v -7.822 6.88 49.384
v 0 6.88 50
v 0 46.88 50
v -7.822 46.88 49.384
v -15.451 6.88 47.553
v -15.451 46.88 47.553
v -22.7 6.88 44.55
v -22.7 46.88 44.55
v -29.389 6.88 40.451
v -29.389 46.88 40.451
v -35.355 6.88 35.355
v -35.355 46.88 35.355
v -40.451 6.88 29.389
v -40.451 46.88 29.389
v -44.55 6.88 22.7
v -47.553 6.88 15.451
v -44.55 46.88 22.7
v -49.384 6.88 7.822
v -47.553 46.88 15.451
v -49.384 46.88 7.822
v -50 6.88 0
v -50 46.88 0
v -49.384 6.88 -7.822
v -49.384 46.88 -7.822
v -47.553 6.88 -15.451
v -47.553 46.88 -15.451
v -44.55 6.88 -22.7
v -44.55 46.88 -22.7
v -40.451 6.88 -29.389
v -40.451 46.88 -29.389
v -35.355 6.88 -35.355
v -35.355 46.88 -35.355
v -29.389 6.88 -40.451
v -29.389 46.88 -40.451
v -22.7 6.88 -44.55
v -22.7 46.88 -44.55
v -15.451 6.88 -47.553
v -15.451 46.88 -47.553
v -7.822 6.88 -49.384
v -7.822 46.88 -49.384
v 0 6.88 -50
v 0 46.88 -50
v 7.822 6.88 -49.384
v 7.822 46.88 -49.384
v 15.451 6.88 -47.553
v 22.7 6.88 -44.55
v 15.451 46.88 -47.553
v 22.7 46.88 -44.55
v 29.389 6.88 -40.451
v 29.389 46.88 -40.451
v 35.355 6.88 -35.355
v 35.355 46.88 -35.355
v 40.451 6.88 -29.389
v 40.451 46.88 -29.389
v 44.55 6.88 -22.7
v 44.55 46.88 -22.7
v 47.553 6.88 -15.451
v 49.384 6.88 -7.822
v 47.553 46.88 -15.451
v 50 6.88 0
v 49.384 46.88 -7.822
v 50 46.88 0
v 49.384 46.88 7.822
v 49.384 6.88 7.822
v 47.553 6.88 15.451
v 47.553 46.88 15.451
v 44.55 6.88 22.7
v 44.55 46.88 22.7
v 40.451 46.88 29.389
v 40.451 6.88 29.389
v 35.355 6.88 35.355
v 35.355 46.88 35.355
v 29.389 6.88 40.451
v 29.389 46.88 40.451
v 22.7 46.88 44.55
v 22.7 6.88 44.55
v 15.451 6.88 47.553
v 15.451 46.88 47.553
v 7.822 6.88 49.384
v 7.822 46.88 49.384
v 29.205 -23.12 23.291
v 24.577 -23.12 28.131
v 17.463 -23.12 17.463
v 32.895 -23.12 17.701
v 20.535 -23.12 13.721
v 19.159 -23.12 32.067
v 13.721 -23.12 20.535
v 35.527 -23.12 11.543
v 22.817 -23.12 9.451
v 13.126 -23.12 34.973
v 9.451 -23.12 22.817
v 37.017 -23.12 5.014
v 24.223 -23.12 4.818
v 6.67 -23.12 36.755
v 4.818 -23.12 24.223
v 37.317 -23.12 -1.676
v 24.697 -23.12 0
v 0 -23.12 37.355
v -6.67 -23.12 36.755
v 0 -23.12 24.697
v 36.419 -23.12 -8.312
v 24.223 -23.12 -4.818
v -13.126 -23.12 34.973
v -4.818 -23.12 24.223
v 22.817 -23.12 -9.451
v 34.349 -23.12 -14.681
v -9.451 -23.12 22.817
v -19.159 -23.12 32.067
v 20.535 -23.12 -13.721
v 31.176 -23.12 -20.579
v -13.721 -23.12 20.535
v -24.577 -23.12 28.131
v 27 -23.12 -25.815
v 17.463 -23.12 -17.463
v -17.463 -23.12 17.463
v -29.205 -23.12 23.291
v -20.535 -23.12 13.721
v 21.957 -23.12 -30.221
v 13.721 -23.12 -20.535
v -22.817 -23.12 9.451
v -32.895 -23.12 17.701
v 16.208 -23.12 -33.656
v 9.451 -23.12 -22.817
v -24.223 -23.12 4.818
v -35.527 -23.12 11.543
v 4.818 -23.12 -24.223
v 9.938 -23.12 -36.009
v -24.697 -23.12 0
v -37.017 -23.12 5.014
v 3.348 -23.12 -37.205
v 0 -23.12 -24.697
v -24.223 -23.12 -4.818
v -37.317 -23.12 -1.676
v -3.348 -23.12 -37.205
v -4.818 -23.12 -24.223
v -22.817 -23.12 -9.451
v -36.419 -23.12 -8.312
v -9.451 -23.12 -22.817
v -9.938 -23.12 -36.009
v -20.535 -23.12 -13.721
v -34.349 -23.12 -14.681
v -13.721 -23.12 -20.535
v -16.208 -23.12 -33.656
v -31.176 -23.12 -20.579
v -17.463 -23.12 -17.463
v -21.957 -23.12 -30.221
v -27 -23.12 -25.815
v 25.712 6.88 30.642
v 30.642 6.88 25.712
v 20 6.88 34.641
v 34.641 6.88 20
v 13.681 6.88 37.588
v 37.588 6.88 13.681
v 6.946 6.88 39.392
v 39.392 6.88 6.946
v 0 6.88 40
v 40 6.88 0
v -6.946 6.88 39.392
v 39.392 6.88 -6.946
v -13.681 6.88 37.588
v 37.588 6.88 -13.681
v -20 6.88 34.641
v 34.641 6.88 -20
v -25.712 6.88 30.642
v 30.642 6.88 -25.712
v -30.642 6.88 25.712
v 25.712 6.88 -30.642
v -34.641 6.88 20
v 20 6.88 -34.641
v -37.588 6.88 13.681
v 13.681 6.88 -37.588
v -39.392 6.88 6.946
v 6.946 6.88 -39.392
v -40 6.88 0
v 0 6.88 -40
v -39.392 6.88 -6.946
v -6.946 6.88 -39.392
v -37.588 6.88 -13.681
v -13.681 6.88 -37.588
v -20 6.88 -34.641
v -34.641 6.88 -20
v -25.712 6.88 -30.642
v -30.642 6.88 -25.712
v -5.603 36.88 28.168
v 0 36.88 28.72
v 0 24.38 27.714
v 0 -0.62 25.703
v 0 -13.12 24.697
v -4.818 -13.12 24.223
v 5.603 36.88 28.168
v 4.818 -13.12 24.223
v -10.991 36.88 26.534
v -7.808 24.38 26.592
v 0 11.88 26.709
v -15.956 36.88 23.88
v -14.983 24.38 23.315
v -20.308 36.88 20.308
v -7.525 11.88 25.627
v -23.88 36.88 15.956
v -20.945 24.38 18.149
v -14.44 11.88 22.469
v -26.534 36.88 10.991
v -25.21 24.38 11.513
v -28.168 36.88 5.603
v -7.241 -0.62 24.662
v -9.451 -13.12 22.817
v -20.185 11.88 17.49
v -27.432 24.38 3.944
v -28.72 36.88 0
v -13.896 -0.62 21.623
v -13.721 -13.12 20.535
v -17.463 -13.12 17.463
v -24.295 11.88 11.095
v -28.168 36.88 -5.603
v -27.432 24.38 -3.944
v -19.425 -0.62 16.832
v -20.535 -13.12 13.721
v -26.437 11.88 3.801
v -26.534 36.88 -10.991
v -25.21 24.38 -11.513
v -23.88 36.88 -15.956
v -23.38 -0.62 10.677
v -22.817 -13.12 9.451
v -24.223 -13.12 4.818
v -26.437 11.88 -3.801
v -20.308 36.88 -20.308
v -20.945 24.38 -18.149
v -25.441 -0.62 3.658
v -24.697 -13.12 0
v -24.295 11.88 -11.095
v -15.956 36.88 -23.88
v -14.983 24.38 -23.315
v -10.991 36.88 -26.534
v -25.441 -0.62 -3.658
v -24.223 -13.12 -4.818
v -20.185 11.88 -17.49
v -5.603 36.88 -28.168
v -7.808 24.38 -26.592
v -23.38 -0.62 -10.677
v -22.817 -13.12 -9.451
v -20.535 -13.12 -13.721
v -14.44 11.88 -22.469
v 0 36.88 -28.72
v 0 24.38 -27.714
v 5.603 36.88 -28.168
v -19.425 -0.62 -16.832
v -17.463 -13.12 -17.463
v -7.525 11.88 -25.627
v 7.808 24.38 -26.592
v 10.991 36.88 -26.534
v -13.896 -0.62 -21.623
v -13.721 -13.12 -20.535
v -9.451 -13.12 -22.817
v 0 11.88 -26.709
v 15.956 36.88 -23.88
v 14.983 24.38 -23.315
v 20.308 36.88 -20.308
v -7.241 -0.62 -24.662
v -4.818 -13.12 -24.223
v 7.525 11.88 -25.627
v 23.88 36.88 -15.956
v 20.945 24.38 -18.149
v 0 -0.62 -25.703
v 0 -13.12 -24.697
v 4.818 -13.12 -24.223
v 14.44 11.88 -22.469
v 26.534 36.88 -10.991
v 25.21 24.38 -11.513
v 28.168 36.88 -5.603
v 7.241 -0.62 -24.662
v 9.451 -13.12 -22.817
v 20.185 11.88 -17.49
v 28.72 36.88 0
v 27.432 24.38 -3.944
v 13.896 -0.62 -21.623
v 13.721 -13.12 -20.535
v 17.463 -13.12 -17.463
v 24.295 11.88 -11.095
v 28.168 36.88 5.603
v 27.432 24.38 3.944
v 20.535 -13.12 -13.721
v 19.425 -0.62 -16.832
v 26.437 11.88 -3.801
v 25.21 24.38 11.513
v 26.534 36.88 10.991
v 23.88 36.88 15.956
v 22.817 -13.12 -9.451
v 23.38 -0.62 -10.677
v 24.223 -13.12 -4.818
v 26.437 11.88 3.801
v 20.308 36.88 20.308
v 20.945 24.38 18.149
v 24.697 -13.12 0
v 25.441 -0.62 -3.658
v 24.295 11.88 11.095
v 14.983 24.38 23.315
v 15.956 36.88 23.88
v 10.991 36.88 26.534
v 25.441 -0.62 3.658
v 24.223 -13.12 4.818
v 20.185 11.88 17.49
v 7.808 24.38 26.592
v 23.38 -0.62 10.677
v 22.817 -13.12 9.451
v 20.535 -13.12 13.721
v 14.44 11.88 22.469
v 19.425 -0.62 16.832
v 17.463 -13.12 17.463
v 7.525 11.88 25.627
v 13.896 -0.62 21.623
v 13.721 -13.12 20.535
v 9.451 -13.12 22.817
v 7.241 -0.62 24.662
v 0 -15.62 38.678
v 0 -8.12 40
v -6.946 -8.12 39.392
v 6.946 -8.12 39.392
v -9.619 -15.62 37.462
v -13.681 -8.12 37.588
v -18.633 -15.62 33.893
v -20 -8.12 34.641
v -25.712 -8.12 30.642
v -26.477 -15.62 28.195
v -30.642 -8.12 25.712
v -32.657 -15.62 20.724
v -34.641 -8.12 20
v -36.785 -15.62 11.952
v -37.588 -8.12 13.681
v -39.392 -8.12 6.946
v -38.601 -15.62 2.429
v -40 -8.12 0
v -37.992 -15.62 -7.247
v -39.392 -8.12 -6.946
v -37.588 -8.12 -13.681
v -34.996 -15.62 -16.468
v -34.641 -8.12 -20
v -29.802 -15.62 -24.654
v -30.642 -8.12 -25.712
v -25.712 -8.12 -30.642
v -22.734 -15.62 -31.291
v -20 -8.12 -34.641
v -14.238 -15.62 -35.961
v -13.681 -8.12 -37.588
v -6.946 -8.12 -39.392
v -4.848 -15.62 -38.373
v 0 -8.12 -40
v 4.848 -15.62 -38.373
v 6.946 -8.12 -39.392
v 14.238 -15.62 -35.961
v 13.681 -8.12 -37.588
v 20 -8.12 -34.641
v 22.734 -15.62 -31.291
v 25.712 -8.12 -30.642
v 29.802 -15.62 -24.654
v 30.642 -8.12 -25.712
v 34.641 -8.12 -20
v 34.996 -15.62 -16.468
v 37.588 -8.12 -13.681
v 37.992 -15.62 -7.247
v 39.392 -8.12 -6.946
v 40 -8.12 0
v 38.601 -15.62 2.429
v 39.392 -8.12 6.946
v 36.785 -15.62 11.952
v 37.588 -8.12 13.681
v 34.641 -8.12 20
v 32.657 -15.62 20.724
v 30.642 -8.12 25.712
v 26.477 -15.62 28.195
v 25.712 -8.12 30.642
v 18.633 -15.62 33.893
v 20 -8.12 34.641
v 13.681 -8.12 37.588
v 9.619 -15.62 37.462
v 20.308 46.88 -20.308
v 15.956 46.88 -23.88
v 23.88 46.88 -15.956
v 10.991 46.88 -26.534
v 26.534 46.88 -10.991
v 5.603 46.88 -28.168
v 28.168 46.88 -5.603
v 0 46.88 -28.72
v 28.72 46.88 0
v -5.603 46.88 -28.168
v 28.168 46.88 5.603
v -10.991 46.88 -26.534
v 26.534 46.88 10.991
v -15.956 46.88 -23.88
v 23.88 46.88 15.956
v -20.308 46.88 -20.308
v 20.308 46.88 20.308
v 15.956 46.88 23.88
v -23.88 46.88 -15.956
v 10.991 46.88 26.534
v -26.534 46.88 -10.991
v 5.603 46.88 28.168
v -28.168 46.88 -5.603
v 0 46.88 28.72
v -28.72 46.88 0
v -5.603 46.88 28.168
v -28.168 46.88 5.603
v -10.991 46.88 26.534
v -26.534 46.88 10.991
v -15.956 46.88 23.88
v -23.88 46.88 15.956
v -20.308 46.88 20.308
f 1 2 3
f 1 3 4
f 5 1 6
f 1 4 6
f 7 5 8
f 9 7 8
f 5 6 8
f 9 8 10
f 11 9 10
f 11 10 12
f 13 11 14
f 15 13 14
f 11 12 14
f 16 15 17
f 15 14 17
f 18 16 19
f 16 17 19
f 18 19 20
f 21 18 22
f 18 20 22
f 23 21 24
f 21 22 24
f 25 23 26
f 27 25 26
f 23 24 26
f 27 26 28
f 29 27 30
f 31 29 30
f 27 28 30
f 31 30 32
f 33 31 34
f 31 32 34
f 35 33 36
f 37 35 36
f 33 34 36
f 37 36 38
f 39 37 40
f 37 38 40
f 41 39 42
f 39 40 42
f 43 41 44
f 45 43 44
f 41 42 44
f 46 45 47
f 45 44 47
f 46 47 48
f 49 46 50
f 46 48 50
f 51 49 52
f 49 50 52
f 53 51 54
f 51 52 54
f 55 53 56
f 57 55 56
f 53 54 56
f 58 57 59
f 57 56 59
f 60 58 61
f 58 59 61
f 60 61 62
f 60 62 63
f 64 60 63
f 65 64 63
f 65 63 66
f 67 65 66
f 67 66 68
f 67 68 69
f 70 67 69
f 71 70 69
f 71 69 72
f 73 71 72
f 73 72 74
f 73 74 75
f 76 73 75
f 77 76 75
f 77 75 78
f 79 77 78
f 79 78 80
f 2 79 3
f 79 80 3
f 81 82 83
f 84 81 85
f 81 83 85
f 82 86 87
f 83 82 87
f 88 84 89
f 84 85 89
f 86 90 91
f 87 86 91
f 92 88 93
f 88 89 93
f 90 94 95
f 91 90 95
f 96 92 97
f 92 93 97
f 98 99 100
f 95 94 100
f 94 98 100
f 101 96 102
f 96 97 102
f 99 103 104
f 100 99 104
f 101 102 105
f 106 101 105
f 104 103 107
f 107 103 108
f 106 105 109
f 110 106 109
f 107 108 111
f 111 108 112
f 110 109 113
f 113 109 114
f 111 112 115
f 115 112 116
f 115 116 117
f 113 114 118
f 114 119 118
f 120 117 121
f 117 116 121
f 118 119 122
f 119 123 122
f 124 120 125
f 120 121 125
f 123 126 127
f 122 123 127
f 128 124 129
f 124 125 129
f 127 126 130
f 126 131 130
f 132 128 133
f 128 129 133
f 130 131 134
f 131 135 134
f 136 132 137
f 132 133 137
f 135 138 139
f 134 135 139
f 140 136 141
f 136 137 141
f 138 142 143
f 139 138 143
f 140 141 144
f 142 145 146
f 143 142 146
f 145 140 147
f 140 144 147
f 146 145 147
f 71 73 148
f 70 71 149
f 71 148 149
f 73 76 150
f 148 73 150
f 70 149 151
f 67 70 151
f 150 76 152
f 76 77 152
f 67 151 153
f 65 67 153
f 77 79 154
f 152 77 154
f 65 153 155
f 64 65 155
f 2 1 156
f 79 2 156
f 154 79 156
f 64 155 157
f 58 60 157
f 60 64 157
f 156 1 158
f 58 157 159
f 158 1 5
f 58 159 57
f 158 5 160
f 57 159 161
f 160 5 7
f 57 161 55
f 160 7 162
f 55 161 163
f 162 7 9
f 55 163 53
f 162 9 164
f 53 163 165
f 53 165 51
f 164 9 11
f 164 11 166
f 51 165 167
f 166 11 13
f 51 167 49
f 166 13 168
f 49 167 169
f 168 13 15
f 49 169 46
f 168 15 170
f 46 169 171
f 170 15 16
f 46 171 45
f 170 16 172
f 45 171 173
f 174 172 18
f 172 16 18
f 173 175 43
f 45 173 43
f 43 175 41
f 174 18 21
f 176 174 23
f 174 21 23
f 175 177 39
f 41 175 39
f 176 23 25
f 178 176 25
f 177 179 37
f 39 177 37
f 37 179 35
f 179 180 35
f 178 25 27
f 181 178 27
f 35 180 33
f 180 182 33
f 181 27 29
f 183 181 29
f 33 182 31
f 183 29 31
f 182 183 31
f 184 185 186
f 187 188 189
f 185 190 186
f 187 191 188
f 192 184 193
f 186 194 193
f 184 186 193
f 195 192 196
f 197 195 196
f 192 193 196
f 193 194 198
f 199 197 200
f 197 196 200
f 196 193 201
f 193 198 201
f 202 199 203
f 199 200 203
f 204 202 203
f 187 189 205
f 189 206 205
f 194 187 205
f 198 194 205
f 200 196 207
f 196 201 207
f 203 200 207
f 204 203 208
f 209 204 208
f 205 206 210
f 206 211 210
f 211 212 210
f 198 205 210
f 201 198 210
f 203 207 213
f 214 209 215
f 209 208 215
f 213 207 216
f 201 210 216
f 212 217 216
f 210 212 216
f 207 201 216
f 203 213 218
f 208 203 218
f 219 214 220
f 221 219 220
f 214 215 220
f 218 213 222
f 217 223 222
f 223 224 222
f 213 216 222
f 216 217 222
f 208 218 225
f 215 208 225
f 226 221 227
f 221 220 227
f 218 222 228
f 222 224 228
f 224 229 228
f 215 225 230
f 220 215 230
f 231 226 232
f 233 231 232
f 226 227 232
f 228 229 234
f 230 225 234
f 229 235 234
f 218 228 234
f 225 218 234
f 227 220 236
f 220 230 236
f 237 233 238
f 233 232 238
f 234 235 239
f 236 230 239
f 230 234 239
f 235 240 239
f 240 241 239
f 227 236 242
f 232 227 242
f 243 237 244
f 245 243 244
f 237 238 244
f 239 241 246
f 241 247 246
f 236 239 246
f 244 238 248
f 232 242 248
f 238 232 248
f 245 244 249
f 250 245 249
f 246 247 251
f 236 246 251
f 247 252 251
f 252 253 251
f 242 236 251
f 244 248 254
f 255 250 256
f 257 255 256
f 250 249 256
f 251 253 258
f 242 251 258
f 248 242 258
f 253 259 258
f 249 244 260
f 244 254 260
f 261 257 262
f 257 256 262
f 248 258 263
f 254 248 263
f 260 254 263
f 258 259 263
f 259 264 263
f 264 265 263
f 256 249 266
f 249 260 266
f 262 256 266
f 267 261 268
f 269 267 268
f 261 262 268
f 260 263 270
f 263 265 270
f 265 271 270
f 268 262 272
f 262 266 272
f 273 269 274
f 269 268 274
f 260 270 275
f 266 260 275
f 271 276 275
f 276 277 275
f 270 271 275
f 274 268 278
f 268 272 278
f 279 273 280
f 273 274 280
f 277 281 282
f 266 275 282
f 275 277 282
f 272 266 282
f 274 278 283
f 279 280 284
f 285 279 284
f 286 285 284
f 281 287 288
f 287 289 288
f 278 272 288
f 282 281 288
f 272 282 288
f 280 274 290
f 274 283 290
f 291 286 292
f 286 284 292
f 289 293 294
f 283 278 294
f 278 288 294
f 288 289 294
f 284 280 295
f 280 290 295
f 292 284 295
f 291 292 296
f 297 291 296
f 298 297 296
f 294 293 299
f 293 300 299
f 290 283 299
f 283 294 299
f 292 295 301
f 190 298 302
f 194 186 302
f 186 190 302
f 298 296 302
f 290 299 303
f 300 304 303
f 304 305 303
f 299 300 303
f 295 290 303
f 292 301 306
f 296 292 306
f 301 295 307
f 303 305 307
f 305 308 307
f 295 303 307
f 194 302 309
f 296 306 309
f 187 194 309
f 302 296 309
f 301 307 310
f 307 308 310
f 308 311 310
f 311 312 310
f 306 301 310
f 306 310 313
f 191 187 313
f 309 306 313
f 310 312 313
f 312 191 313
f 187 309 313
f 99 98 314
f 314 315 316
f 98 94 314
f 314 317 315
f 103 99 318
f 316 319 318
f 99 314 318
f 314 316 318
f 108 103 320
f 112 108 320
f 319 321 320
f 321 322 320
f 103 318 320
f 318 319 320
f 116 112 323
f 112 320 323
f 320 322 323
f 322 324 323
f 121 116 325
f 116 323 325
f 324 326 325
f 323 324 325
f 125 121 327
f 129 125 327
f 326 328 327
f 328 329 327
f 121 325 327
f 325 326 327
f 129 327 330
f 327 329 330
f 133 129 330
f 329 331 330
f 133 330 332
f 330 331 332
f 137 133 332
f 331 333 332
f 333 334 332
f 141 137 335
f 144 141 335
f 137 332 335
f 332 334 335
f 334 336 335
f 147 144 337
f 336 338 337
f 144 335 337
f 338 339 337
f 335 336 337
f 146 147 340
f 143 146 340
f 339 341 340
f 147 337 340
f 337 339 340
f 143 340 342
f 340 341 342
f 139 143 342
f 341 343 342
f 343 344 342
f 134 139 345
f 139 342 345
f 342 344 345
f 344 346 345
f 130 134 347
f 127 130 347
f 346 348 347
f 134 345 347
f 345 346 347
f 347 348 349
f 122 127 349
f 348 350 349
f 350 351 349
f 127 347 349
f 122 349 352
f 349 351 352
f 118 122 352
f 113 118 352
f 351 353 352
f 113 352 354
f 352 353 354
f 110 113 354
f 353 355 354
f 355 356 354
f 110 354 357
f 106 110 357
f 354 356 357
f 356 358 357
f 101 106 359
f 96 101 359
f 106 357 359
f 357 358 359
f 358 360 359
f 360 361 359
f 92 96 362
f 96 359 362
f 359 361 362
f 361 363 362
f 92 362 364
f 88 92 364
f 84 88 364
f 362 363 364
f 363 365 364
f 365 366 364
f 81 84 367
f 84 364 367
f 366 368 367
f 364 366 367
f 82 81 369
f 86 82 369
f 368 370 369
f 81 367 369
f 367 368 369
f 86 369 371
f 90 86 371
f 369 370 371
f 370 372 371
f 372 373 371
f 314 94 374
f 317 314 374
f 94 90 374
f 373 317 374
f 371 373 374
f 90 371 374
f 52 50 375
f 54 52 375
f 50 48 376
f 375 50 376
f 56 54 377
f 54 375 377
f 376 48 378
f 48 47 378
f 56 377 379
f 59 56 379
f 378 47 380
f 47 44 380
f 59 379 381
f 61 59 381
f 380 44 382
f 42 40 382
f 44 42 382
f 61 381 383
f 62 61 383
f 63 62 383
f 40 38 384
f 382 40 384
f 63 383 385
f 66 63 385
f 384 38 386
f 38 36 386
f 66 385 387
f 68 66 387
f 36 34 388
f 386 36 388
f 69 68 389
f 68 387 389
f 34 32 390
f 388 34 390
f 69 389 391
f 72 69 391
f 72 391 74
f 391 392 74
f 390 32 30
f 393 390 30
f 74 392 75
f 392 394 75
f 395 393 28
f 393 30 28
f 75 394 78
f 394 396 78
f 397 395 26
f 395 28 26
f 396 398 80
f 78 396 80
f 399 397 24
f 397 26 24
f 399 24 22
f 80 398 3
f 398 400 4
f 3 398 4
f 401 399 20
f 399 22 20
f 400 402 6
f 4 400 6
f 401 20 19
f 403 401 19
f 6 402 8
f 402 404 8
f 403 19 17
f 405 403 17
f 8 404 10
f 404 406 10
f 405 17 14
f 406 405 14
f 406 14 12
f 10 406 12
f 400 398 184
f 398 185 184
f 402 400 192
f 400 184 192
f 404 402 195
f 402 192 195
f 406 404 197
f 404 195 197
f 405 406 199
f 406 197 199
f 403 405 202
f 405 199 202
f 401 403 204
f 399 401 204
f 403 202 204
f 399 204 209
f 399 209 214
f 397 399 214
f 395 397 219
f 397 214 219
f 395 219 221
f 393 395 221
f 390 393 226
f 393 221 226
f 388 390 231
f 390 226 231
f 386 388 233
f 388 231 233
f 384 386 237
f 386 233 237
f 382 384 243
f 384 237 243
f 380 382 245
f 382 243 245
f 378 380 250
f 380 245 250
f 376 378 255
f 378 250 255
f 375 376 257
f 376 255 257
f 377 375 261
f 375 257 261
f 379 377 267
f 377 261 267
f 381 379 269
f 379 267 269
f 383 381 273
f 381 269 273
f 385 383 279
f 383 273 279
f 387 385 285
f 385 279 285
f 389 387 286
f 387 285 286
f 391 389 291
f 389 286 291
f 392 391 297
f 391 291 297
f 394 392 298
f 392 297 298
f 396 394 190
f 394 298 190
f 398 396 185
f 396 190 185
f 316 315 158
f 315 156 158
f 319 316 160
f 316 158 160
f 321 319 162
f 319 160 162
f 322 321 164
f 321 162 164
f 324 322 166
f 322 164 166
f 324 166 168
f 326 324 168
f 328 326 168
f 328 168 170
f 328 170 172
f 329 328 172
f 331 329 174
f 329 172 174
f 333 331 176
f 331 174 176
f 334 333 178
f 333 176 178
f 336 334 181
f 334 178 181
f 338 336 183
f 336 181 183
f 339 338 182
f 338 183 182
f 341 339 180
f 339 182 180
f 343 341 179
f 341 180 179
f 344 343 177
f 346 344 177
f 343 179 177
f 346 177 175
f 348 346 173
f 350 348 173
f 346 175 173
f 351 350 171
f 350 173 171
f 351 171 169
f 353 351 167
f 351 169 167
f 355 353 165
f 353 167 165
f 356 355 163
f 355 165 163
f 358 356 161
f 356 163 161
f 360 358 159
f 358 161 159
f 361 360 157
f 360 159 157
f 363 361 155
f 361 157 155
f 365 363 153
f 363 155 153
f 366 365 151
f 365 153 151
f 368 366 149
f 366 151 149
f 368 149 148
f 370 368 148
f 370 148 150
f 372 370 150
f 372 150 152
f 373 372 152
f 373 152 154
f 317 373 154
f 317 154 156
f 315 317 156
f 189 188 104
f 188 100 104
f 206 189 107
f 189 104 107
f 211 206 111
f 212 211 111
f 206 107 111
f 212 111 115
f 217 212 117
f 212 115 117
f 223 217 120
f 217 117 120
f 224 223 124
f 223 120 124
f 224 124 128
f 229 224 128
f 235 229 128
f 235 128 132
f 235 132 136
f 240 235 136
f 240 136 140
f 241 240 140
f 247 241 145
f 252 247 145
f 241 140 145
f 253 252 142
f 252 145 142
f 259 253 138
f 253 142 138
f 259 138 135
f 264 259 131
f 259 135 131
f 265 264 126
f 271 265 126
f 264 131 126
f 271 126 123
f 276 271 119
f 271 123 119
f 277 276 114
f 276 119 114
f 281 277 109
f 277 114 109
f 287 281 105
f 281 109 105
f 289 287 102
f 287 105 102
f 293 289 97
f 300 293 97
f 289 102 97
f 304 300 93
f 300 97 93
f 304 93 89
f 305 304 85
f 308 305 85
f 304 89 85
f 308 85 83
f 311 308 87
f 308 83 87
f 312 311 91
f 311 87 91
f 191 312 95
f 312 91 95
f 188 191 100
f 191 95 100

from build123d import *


with BuildPart() as part:
    # Szkic1 → Obrót1 (revolve)
    with BuildSketch(Plane.XY, mode=Mode.PRIVATE) as obr_t1_sk:
        Polygon((-28.72, 46.880116473), (-28.72, 36.880116473), (-24.697095519, -13.119883527), (-24.697095519, -23.119883527), (-37.355095289, -23.119883527), (-40, -8.119883527), (-40, 6.880116473), (-50, 6.880116473), (-50, 46.880116473), align=None)
    revolve(obr_t1_sk.sketch.rotate(Axis((0, 46.880116473, 0), (0, -1, 0)), 270), axis=Axis((0, 46.880116473, 0), (0, -1, 0)))


solid = part.part
